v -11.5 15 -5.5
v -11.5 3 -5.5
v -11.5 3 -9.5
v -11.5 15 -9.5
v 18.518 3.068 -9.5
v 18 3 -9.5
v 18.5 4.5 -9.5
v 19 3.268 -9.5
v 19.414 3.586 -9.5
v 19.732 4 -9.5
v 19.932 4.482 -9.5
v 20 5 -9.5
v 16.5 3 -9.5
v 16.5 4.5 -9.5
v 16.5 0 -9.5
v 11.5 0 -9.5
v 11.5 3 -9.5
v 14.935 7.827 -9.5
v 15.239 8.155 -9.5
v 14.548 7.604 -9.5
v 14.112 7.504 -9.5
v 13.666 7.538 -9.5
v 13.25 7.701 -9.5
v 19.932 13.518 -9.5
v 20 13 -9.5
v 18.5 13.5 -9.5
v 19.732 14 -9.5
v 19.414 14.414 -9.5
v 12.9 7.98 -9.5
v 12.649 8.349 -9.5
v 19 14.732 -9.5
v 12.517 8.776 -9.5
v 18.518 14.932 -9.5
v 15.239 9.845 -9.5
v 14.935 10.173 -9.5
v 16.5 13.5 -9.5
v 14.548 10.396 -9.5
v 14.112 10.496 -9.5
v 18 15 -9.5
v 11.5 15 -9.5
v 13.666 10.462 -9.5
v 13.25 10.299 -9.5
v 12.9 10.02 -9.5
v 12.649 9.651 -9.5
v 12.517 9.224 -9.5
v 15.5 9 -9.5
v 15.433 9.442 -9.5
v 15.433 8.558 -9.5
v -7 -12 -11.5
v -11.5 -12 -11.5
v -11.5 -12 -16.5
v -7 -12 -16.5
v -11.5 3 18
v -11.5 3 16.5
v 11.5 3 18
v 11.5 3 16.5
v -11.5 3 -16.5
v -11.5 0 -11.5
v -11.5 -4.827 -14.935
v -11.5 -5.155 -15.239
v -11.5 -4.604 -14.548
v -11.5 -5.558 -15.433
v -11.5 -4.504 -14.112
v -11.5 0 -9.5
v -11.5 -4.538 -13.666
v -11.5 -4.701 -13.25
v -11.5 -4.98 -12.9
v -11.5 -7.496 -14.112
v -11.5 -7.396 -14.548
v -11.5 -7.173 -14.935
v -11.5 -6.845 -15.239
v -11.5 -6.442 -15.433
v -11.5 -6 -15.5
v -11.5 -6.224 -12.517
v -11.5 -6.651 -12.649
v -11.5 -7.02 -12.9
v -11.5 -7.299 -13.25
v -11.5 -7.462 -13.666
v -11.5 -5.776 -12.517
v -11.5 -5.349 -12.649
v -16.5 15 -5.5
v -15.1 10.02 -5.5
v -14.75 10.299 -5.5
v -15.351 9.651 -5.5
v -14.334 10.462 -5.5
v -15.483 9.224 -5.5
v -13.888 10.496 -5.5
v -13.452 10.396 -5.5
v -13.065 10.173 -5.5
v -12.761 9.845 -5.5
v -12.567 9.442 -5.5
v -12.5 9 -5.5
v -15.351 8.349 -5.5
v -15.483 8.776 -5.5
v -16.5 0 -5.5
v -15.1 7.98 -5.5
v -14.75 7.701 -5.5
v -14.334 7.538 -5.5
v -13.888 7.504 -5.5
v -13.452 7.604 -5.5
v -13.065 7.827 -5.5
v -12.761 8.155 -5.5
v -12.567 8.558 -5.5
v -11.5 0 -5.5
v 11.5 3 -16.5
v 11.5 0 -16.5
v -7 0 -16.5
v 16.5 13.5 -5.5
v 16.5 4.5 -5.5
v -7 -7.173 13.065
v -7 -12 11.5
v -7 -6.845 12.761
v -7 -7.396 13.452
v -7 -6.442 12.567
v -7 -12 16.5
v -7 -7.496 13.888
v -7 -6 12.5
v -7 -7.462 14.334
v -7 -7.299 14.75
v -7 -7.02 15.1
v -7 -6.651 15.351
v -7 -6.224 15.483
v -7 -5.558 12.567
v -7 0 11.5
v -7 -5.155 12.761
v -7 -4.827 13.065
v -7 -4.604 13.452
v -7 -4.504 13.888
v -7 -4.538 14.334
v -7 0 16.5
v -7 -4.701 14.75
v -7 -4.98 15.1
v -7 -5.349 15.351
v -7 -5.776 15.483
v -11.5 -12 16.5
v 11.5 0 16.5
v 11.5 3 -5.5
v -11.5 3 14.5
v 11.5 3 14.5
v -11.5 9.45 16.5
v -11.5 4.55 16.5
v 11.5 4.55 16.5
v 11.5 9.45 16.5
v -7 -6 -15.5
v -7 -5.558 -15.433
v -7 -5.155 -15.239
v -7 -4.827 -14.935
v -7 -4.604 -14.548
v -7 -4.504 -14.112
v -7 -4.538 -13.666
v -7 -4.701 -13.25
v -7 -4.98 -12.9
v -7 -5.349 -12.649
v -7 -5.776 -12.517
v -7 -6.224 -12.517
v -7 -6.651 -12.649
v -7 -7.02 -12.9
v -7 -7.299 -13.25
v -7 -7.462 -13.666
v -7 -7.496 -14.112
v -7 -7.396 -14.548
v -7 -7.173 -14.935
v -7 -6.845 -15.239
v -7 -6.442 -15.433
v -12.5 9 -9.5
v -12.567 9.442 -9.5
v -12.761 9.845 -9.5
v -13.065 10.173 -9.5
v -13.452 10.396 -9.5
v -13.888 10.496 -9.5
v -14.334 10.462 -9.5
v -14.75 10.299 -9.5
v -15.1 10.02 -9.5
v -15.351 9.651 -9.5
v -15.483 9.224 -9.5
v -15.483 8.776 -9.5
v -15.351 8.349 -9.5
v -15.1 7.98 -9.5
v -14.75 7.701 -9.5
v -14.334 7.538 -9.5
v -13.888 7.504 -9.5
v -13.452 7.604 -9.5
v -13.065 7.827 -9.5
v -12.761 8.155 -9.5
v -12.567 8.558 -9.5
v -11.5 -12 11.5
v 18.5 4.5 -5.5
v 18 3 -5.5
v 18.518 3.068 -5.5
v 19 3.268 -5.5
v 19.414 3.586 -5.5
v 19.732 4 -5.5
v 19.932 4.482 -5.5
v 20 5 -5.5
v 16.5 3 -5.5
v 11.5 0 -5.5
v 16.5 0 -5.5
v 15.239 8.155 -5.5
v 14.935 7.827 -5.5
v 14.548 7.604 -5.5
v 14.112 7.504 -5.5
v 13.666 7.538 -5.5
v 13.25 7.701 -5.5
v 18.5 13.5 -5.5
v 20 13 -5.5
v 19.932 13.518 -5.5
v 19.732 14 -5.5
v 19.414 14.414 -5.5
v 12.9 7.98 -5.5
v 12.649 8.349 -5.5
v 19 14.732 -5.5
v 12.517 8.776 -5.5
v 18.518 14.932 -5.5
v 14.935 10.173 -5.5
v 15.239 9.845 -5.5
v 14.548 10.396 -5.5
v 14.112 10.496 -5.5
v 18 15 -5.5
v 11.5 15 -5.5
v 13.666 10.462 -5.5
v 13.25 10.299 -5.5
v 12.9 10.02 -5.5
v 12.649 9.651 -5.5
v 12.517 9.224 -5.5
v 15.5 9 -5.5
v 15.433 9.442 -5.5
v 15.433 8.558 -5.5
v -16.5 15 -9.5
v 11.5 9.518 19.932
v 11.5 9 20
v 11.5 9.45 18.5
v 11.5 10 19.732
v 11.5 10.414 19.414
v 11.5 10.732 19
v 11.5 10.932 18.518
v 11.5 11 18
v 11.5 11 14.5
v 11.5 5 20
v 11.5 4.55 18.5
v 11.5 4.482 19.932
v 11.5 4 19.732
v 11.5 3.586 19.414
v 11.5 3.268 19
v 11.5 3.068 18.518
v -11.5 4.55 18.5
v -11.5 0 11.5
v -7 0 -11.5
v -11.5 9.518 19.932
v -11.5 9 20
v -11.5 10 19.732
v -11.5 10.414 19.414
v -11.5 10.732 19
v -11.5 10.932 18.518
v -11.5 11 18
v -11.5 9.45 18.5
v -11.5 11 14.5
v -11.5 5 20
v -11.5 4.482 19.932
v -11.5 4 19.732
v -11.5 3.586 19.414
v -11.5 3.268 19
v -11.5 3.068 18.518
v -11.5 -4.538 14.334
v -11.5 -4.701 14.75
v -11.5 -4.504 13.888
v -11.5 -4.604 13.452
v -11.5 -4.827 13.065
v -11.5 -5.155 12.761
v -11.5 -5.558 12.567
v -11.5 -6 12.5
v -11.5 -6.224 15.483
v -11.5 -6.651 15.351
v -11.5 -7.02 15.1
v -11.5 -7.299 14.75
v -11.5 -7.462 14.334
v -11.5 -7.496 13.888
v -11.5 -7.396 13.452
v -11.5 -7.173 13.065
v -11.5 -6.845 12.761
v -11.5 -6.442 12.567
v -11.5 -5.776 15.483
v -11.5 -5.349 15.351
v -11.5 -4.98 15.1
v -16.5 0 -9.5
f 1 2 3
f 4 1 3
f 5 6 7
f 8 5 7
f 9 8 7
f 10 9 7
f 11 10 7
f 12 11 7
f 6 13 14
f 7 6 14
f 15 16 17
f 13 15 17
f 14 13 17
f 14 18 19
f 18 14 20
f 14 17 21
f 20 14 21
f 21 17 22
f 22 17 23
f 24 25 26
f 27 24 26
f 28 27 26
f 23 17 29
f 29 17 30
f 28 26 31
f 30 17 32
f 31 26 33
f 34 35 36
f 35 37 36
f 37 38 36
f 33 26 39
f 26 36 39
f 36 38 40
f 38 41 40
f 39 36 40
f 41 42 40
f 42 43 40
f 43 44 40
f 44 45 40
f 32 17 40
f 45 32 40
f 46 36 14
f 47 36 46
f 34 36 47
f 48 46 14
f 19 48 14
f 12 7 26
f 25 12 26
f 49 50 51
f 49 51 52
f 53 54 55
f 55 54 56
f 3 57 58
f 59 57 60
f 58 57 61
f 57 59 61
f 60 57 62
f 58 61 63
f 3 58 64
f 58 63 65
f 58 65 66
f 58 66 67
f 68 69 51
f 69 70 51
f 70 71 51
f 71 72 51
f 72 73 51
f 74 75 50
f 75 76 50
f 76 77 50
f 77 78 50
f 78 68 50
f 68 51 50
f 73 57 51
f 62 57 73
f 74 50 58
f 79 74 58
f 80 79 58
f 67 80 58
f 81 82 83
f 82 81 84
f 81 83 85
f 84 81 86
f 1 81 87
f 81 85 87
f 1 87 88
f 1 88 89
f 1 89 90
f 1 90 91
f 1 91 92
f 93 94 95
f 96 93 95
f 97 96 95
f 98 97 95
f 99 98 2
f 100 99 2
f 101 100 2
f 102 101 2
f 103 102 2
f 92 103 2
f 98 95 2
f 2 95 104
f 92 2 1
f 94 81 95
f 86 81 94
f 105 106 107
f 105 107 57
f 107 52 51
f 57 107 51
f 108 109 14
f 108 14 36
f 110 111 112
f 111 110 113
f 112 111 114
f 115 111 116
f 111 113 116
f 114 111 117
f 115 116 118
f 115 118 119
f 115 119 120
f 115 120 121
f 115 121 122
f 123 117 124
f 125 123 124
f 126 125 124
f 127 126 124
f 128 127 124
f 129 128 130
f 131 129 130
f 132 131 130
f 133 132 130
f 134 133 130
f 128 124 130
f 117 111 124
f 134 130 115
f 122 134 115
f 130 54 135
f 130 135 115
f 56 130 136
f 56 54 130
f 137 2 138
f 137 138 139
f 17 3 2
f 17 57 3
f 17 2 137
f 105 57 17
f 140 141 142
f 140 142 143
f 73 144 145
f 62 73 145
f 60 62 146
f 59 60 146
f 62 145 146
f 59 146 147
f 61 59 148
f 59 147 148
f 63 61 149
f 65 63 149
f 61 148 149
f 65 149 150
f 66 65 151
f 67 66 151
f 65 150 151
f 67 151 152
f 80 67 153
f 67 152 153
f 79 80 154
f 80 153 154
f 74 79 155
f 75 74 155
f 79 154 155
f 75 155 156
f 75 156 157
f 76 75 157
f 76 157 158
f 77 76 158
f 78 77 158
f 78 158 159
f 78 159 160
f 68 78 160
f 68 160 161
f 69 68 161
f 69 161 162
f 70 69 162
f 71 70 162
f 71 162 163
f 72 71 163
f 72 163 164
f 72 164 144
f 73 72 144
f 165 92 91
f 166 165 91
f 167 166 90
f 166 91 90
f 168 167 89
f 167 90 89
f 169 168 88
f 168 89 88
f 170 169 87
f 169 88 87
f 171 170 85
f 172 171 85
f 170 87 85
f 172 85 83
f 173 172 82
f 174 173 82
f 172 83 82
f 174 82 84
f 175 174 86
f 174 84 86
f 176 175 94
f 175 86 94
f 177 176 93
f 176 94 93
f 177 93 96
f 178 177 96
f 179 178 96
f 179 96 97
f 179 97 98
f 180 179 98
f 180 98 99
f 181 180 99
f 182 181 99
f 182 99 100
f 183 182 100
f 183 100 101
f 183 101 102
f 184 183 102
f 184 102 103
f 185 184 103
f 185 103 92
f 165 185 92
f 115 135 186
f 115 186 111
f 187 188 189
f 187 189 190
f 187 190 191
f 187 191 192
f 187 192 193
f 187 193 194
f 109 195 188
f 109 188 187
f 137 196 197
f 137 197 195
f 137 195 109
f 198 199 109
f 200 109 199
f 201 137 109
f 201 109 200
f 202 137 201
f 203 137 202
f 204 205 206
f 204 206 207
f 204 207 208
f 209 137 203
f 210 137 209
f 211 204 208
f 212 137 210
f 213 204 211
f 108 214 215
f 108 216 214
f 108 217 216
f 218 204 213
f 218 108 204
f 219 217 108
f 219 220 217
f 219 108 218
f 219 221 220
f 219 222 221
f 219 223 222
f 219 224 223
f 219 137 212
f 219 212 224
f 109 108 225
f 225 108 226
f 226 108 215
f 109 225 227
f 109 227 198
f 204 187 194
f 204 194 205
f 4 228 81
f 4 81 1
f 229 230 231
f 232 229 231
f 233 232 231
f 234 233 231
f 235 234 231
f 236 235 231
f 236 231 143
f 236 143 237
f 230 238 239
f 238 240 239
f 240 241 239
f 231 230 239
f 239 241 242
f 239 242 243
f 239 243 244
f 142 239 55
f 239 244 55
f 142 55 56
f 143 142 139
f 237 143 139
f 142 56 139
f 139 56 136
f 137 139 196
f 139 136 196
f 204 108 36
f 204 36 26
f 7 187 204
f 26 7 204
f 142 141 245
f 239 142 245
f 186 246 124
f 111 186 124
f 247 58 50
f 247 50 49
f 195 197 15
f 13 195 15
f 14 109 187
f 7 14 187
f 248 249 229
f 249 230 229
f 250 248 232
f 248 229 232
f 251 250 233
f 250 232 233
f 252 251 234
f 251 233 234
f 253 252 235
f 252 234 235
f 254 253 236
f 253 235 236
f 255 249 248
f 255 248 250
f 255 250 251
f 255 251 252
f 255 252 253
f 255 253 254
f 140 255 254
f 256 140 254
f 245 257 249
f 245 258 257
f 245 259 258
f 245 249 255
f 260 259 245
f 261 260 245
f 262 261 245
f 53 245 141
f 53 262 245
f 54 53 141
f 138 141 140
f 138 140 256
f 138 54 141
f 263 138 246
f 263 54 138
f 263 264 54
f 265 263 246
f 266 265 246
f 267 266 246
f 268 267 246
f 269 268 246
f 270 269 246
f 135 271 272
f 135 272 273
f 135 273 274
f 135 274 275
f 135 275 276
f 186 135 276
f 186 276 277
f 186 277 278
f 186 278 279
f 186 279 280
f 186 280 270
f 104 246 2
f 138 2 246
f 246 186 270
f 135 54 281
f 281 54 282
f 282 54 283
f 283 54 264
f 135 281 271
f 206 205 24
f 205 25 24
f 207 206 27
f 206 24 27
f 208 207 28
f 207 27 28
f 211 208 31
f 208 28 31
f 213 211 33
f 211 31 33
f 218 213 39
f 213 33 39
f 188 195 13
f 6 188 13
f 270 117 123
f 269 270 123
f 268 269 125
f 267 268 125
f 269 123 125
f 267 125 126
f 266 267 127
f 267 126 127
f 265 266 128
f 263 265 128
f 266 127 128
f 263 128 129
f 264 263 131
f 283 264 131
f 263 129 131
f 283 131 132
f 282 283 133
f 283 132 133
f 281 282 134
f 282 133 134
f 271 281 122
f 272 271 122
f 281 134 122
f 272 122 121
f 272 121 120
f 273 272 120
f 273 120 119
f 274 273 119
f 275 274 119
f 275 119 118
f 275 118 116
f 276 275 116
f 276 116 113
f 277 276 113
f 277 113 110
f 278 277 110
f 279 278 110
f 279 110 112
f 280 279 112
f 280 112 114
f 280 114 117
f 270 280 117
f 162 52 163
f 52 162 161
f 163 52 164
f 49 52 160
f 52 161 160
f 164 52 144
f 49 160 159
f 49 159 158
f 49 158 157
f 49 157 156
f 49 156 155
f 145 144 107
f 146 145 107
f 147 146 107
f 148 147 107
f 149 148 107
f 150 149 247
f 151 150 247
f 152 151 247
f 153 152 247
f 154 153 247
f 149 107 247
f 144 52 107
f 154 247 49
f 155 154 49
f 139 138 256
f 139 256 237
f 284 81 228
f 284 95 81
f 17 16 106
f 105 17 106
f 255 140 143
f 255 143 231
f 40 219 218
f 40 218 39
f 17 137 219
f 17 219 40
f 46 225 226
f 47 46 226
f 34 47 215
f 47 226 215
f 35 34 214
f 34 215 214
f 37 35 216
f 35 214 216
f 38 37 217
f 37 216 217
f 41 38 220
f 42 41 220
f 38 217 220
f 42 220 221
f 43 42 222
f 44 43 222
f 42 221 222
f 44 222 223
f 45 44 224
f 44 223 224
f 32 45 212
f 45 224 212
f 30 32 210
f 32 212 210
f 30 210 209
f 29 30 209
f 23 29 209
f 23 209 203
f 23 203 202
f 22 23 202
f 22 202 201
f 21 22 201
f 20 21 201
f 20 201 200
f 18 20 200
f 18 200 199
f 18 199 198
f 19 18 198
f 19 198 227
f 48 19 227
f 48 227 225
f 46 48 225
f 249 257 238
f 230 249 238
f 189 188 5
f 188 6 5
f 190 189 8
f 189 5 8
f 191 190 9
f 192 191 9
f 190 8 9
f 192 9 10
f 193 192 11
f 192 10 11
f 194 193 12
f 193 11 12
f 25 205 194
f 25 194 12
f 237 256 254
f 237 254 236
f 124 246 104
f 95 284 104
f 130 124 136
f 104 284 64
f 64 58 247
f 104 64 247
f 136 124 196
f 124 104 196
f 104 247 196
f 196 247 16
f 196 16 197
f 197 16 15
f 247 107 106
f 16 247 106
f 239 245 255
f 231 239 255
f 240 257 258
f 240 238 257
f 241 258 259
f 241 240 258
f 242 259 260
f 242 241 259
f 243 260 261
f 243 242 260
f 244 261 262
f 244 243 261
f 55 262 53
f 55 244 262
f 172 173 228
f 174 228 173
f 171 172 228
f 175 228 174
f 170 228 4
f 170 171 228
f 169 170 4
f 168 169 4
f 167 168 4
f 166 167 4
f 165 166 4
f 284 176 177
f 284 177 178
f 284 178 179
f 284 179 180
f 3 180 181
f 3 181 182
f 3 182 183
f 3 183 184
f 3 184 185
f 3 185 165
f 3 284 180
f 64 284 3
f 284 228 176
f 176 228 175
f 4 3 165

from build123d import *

# Parameters (mm, degrees)
BOSS_EXTRUDE1_DEPTH = 3
SKETCH3_W           = 4.5
SKETCH3_H           = 5
BOSS_EXTRUDE2_DEPTH = 12
SKETCH4_W           = 5
SKETCH4_H           = 4
BOSS_EXTRUDE3_DEPTH = 12
SKETCH5_R           = 1.5
CUT_EXTRUDE1_DEPTH  = 12
SKETCH6_R           = 1.5
CUT_EXTRUDE2_DEPTH  = 12
SKETCH7_W           = 23
SKETCH7_H           = 5.5
BOSS_EXTRUDE5_DEPTH = 8
SKETCH8_W           = 2
SKETCH8_H           = 4.9
CUT_EXTRUDE3_DEPTH  = 28
FILLET1_R           = 2
SKETCH11_W          = 4
SKETCH11_H          = 12
BOSS_EXTRUDE6_DEPTH = 3.5
SKETCH12_W          = 2
SKETCH12_H          = 9
CUT_EXTRUDE5_DEPTH  = 10
FILLET3_R           = 2


with BuildPart() as part:
    # Sketch2 → Boss-Extrude1 (new body)
    with BuildSketch(Plane(origin=(0, 0, 0), x_dir=(1, 0, 0), z_dir=(0, 1, 0))):
        Polygon((-11.5, 5.5), (-11.5, -16.5), (11.5, -16.5), (11.5, 5.5), (16.5, 5.5), (16.5, 9.5), (11.5, 9.5), (11.5, 16.5), (-11.5, 16.5), (-11.5, 9.5), (-16.5, 9.5), (-16.5, 5.5), align=None)
    extrude(amount=BOSS_EXTRUDE1_DEPTH)

    # Sketch3 → Boss-Extrude2 (add)
    with BuildSketch(Plane.XZ):
        with Locations((-9.25, 14)):
            Rectangle(SKETCH3_W, SKETCH3_H)
        with Locations((-9.25, -14)):
            Rectangle(SKETCH3_W, SKETCH3_H)
    extrude(amount=BOSS_EXTRUDE2_DEPTH)

    # Sketch4 → Boss-Extrude3 (add)
    with BuildSketch(Plane(origin=(0, 3, 0), x_dir=(1, 0, 0), z_dir=(0, 1, 0))):
        with Locations((-14, 7.5)):
            Rectangle(SKETCH4_W, SKETCH4_H)
        with Locations((14, 7.5)):
            Rectangle(SKETCH4_W, SKETCH4_H)
    extrude(amount=BOSS_EXTRUDE3_DEPTH)

    # Sketch5 → Cut-Extrude1 (cut)
    with BuildSketch(Plane.XY.offset(-5.5)):
        with Locations((14, 9)):
            Circle(SKETCH5_R)
        with Locations((-14, 9)):
            Circle(SKETCH5_R)
    extrude(amount=-CUT_EXTRUDE1_DEPTH, mode=Mode.SUBTRACT)

    # Sketch6 → Cut-Extrude2 (cut)
    with BuildSketch(Plane(origin=(-7, 0, 0), x_dir=(0, 0, -1), z_dir=(1, 0, 0))):
        with Locations((-14, -6)):
            Circle(SKETCH6_R)
        with Locations((14, -6)):
            Circle(SKETCH6_R)
    extrude(amount=-CUT_EXTRUDE2_DEPTH, mode=Mode.SUBTRACT)

    # Sketch7 → Boss-Extrude5 (add)
    with BuildSketch(Plane(origin=(0, 3, 0), x_dir=(1, 0, 0), z_dir=(0, 1, 0))):
        with Locations((0, -17.25)):
            Rectangle(SKETCH7_W, SKETCH7_H)
    extrude(amount=BOSS_EXTRUDE5_DEPTH)

    # Sketch8 → Cut-Extrude3 (cut)
    with BuildSketch(Plane.ZY.offset(11.5)):
        with Locations((17.5, 7)):
            Rectangle(SKETCH8_W, SKETCH8_H)
    extrude(amount=-CUT_EXTRUDE3_DEPTH, mode=Mode.SUBTRACT)

    # Fillet1
    fillet1_edges = [part.edges().sort_by_distance(p)[0] for p in [
        (0, 3, 20),
        (0, 11, 20),
    ]]
    fillet(fillet1_edges, radius=FILLET1_R)

    # Sketch11 → Boss-Extrude6 (add)
    with BuildSketch(Plane(origin=(16.5, 0, 0), x_dir=(0, 0, -1), z_dir=(1, 0, 0))):
        with Locations((7.5, 9)):
            Rectangle(SKETCH11_W, SKETCH11_H)
    extrude(amount=BOSS_EXTRUDE6_DEPTH)

    # Sketch12 → Cut-Extrude5 (cut)
    with BuildSketch(Plane.XY.offset(-5.5)):
        with Locations((17.5, 9)):
            Rectangle(SKETCH12_W, SKETCH12_H)
    extrude(amount=-CUT_EXTRUDE5_DEPTH, mode=Mode.SUBTRACT)

    # Fillet3
    fillet3_edges = [part.edges().sort_by_distance(p)[0] for p in [
        (20, 3, -7.5),
        (20, 15, -7.5),
    ]]
    fillet(fillet3_edges, radius=FILLET3_R)


solid = part.part
